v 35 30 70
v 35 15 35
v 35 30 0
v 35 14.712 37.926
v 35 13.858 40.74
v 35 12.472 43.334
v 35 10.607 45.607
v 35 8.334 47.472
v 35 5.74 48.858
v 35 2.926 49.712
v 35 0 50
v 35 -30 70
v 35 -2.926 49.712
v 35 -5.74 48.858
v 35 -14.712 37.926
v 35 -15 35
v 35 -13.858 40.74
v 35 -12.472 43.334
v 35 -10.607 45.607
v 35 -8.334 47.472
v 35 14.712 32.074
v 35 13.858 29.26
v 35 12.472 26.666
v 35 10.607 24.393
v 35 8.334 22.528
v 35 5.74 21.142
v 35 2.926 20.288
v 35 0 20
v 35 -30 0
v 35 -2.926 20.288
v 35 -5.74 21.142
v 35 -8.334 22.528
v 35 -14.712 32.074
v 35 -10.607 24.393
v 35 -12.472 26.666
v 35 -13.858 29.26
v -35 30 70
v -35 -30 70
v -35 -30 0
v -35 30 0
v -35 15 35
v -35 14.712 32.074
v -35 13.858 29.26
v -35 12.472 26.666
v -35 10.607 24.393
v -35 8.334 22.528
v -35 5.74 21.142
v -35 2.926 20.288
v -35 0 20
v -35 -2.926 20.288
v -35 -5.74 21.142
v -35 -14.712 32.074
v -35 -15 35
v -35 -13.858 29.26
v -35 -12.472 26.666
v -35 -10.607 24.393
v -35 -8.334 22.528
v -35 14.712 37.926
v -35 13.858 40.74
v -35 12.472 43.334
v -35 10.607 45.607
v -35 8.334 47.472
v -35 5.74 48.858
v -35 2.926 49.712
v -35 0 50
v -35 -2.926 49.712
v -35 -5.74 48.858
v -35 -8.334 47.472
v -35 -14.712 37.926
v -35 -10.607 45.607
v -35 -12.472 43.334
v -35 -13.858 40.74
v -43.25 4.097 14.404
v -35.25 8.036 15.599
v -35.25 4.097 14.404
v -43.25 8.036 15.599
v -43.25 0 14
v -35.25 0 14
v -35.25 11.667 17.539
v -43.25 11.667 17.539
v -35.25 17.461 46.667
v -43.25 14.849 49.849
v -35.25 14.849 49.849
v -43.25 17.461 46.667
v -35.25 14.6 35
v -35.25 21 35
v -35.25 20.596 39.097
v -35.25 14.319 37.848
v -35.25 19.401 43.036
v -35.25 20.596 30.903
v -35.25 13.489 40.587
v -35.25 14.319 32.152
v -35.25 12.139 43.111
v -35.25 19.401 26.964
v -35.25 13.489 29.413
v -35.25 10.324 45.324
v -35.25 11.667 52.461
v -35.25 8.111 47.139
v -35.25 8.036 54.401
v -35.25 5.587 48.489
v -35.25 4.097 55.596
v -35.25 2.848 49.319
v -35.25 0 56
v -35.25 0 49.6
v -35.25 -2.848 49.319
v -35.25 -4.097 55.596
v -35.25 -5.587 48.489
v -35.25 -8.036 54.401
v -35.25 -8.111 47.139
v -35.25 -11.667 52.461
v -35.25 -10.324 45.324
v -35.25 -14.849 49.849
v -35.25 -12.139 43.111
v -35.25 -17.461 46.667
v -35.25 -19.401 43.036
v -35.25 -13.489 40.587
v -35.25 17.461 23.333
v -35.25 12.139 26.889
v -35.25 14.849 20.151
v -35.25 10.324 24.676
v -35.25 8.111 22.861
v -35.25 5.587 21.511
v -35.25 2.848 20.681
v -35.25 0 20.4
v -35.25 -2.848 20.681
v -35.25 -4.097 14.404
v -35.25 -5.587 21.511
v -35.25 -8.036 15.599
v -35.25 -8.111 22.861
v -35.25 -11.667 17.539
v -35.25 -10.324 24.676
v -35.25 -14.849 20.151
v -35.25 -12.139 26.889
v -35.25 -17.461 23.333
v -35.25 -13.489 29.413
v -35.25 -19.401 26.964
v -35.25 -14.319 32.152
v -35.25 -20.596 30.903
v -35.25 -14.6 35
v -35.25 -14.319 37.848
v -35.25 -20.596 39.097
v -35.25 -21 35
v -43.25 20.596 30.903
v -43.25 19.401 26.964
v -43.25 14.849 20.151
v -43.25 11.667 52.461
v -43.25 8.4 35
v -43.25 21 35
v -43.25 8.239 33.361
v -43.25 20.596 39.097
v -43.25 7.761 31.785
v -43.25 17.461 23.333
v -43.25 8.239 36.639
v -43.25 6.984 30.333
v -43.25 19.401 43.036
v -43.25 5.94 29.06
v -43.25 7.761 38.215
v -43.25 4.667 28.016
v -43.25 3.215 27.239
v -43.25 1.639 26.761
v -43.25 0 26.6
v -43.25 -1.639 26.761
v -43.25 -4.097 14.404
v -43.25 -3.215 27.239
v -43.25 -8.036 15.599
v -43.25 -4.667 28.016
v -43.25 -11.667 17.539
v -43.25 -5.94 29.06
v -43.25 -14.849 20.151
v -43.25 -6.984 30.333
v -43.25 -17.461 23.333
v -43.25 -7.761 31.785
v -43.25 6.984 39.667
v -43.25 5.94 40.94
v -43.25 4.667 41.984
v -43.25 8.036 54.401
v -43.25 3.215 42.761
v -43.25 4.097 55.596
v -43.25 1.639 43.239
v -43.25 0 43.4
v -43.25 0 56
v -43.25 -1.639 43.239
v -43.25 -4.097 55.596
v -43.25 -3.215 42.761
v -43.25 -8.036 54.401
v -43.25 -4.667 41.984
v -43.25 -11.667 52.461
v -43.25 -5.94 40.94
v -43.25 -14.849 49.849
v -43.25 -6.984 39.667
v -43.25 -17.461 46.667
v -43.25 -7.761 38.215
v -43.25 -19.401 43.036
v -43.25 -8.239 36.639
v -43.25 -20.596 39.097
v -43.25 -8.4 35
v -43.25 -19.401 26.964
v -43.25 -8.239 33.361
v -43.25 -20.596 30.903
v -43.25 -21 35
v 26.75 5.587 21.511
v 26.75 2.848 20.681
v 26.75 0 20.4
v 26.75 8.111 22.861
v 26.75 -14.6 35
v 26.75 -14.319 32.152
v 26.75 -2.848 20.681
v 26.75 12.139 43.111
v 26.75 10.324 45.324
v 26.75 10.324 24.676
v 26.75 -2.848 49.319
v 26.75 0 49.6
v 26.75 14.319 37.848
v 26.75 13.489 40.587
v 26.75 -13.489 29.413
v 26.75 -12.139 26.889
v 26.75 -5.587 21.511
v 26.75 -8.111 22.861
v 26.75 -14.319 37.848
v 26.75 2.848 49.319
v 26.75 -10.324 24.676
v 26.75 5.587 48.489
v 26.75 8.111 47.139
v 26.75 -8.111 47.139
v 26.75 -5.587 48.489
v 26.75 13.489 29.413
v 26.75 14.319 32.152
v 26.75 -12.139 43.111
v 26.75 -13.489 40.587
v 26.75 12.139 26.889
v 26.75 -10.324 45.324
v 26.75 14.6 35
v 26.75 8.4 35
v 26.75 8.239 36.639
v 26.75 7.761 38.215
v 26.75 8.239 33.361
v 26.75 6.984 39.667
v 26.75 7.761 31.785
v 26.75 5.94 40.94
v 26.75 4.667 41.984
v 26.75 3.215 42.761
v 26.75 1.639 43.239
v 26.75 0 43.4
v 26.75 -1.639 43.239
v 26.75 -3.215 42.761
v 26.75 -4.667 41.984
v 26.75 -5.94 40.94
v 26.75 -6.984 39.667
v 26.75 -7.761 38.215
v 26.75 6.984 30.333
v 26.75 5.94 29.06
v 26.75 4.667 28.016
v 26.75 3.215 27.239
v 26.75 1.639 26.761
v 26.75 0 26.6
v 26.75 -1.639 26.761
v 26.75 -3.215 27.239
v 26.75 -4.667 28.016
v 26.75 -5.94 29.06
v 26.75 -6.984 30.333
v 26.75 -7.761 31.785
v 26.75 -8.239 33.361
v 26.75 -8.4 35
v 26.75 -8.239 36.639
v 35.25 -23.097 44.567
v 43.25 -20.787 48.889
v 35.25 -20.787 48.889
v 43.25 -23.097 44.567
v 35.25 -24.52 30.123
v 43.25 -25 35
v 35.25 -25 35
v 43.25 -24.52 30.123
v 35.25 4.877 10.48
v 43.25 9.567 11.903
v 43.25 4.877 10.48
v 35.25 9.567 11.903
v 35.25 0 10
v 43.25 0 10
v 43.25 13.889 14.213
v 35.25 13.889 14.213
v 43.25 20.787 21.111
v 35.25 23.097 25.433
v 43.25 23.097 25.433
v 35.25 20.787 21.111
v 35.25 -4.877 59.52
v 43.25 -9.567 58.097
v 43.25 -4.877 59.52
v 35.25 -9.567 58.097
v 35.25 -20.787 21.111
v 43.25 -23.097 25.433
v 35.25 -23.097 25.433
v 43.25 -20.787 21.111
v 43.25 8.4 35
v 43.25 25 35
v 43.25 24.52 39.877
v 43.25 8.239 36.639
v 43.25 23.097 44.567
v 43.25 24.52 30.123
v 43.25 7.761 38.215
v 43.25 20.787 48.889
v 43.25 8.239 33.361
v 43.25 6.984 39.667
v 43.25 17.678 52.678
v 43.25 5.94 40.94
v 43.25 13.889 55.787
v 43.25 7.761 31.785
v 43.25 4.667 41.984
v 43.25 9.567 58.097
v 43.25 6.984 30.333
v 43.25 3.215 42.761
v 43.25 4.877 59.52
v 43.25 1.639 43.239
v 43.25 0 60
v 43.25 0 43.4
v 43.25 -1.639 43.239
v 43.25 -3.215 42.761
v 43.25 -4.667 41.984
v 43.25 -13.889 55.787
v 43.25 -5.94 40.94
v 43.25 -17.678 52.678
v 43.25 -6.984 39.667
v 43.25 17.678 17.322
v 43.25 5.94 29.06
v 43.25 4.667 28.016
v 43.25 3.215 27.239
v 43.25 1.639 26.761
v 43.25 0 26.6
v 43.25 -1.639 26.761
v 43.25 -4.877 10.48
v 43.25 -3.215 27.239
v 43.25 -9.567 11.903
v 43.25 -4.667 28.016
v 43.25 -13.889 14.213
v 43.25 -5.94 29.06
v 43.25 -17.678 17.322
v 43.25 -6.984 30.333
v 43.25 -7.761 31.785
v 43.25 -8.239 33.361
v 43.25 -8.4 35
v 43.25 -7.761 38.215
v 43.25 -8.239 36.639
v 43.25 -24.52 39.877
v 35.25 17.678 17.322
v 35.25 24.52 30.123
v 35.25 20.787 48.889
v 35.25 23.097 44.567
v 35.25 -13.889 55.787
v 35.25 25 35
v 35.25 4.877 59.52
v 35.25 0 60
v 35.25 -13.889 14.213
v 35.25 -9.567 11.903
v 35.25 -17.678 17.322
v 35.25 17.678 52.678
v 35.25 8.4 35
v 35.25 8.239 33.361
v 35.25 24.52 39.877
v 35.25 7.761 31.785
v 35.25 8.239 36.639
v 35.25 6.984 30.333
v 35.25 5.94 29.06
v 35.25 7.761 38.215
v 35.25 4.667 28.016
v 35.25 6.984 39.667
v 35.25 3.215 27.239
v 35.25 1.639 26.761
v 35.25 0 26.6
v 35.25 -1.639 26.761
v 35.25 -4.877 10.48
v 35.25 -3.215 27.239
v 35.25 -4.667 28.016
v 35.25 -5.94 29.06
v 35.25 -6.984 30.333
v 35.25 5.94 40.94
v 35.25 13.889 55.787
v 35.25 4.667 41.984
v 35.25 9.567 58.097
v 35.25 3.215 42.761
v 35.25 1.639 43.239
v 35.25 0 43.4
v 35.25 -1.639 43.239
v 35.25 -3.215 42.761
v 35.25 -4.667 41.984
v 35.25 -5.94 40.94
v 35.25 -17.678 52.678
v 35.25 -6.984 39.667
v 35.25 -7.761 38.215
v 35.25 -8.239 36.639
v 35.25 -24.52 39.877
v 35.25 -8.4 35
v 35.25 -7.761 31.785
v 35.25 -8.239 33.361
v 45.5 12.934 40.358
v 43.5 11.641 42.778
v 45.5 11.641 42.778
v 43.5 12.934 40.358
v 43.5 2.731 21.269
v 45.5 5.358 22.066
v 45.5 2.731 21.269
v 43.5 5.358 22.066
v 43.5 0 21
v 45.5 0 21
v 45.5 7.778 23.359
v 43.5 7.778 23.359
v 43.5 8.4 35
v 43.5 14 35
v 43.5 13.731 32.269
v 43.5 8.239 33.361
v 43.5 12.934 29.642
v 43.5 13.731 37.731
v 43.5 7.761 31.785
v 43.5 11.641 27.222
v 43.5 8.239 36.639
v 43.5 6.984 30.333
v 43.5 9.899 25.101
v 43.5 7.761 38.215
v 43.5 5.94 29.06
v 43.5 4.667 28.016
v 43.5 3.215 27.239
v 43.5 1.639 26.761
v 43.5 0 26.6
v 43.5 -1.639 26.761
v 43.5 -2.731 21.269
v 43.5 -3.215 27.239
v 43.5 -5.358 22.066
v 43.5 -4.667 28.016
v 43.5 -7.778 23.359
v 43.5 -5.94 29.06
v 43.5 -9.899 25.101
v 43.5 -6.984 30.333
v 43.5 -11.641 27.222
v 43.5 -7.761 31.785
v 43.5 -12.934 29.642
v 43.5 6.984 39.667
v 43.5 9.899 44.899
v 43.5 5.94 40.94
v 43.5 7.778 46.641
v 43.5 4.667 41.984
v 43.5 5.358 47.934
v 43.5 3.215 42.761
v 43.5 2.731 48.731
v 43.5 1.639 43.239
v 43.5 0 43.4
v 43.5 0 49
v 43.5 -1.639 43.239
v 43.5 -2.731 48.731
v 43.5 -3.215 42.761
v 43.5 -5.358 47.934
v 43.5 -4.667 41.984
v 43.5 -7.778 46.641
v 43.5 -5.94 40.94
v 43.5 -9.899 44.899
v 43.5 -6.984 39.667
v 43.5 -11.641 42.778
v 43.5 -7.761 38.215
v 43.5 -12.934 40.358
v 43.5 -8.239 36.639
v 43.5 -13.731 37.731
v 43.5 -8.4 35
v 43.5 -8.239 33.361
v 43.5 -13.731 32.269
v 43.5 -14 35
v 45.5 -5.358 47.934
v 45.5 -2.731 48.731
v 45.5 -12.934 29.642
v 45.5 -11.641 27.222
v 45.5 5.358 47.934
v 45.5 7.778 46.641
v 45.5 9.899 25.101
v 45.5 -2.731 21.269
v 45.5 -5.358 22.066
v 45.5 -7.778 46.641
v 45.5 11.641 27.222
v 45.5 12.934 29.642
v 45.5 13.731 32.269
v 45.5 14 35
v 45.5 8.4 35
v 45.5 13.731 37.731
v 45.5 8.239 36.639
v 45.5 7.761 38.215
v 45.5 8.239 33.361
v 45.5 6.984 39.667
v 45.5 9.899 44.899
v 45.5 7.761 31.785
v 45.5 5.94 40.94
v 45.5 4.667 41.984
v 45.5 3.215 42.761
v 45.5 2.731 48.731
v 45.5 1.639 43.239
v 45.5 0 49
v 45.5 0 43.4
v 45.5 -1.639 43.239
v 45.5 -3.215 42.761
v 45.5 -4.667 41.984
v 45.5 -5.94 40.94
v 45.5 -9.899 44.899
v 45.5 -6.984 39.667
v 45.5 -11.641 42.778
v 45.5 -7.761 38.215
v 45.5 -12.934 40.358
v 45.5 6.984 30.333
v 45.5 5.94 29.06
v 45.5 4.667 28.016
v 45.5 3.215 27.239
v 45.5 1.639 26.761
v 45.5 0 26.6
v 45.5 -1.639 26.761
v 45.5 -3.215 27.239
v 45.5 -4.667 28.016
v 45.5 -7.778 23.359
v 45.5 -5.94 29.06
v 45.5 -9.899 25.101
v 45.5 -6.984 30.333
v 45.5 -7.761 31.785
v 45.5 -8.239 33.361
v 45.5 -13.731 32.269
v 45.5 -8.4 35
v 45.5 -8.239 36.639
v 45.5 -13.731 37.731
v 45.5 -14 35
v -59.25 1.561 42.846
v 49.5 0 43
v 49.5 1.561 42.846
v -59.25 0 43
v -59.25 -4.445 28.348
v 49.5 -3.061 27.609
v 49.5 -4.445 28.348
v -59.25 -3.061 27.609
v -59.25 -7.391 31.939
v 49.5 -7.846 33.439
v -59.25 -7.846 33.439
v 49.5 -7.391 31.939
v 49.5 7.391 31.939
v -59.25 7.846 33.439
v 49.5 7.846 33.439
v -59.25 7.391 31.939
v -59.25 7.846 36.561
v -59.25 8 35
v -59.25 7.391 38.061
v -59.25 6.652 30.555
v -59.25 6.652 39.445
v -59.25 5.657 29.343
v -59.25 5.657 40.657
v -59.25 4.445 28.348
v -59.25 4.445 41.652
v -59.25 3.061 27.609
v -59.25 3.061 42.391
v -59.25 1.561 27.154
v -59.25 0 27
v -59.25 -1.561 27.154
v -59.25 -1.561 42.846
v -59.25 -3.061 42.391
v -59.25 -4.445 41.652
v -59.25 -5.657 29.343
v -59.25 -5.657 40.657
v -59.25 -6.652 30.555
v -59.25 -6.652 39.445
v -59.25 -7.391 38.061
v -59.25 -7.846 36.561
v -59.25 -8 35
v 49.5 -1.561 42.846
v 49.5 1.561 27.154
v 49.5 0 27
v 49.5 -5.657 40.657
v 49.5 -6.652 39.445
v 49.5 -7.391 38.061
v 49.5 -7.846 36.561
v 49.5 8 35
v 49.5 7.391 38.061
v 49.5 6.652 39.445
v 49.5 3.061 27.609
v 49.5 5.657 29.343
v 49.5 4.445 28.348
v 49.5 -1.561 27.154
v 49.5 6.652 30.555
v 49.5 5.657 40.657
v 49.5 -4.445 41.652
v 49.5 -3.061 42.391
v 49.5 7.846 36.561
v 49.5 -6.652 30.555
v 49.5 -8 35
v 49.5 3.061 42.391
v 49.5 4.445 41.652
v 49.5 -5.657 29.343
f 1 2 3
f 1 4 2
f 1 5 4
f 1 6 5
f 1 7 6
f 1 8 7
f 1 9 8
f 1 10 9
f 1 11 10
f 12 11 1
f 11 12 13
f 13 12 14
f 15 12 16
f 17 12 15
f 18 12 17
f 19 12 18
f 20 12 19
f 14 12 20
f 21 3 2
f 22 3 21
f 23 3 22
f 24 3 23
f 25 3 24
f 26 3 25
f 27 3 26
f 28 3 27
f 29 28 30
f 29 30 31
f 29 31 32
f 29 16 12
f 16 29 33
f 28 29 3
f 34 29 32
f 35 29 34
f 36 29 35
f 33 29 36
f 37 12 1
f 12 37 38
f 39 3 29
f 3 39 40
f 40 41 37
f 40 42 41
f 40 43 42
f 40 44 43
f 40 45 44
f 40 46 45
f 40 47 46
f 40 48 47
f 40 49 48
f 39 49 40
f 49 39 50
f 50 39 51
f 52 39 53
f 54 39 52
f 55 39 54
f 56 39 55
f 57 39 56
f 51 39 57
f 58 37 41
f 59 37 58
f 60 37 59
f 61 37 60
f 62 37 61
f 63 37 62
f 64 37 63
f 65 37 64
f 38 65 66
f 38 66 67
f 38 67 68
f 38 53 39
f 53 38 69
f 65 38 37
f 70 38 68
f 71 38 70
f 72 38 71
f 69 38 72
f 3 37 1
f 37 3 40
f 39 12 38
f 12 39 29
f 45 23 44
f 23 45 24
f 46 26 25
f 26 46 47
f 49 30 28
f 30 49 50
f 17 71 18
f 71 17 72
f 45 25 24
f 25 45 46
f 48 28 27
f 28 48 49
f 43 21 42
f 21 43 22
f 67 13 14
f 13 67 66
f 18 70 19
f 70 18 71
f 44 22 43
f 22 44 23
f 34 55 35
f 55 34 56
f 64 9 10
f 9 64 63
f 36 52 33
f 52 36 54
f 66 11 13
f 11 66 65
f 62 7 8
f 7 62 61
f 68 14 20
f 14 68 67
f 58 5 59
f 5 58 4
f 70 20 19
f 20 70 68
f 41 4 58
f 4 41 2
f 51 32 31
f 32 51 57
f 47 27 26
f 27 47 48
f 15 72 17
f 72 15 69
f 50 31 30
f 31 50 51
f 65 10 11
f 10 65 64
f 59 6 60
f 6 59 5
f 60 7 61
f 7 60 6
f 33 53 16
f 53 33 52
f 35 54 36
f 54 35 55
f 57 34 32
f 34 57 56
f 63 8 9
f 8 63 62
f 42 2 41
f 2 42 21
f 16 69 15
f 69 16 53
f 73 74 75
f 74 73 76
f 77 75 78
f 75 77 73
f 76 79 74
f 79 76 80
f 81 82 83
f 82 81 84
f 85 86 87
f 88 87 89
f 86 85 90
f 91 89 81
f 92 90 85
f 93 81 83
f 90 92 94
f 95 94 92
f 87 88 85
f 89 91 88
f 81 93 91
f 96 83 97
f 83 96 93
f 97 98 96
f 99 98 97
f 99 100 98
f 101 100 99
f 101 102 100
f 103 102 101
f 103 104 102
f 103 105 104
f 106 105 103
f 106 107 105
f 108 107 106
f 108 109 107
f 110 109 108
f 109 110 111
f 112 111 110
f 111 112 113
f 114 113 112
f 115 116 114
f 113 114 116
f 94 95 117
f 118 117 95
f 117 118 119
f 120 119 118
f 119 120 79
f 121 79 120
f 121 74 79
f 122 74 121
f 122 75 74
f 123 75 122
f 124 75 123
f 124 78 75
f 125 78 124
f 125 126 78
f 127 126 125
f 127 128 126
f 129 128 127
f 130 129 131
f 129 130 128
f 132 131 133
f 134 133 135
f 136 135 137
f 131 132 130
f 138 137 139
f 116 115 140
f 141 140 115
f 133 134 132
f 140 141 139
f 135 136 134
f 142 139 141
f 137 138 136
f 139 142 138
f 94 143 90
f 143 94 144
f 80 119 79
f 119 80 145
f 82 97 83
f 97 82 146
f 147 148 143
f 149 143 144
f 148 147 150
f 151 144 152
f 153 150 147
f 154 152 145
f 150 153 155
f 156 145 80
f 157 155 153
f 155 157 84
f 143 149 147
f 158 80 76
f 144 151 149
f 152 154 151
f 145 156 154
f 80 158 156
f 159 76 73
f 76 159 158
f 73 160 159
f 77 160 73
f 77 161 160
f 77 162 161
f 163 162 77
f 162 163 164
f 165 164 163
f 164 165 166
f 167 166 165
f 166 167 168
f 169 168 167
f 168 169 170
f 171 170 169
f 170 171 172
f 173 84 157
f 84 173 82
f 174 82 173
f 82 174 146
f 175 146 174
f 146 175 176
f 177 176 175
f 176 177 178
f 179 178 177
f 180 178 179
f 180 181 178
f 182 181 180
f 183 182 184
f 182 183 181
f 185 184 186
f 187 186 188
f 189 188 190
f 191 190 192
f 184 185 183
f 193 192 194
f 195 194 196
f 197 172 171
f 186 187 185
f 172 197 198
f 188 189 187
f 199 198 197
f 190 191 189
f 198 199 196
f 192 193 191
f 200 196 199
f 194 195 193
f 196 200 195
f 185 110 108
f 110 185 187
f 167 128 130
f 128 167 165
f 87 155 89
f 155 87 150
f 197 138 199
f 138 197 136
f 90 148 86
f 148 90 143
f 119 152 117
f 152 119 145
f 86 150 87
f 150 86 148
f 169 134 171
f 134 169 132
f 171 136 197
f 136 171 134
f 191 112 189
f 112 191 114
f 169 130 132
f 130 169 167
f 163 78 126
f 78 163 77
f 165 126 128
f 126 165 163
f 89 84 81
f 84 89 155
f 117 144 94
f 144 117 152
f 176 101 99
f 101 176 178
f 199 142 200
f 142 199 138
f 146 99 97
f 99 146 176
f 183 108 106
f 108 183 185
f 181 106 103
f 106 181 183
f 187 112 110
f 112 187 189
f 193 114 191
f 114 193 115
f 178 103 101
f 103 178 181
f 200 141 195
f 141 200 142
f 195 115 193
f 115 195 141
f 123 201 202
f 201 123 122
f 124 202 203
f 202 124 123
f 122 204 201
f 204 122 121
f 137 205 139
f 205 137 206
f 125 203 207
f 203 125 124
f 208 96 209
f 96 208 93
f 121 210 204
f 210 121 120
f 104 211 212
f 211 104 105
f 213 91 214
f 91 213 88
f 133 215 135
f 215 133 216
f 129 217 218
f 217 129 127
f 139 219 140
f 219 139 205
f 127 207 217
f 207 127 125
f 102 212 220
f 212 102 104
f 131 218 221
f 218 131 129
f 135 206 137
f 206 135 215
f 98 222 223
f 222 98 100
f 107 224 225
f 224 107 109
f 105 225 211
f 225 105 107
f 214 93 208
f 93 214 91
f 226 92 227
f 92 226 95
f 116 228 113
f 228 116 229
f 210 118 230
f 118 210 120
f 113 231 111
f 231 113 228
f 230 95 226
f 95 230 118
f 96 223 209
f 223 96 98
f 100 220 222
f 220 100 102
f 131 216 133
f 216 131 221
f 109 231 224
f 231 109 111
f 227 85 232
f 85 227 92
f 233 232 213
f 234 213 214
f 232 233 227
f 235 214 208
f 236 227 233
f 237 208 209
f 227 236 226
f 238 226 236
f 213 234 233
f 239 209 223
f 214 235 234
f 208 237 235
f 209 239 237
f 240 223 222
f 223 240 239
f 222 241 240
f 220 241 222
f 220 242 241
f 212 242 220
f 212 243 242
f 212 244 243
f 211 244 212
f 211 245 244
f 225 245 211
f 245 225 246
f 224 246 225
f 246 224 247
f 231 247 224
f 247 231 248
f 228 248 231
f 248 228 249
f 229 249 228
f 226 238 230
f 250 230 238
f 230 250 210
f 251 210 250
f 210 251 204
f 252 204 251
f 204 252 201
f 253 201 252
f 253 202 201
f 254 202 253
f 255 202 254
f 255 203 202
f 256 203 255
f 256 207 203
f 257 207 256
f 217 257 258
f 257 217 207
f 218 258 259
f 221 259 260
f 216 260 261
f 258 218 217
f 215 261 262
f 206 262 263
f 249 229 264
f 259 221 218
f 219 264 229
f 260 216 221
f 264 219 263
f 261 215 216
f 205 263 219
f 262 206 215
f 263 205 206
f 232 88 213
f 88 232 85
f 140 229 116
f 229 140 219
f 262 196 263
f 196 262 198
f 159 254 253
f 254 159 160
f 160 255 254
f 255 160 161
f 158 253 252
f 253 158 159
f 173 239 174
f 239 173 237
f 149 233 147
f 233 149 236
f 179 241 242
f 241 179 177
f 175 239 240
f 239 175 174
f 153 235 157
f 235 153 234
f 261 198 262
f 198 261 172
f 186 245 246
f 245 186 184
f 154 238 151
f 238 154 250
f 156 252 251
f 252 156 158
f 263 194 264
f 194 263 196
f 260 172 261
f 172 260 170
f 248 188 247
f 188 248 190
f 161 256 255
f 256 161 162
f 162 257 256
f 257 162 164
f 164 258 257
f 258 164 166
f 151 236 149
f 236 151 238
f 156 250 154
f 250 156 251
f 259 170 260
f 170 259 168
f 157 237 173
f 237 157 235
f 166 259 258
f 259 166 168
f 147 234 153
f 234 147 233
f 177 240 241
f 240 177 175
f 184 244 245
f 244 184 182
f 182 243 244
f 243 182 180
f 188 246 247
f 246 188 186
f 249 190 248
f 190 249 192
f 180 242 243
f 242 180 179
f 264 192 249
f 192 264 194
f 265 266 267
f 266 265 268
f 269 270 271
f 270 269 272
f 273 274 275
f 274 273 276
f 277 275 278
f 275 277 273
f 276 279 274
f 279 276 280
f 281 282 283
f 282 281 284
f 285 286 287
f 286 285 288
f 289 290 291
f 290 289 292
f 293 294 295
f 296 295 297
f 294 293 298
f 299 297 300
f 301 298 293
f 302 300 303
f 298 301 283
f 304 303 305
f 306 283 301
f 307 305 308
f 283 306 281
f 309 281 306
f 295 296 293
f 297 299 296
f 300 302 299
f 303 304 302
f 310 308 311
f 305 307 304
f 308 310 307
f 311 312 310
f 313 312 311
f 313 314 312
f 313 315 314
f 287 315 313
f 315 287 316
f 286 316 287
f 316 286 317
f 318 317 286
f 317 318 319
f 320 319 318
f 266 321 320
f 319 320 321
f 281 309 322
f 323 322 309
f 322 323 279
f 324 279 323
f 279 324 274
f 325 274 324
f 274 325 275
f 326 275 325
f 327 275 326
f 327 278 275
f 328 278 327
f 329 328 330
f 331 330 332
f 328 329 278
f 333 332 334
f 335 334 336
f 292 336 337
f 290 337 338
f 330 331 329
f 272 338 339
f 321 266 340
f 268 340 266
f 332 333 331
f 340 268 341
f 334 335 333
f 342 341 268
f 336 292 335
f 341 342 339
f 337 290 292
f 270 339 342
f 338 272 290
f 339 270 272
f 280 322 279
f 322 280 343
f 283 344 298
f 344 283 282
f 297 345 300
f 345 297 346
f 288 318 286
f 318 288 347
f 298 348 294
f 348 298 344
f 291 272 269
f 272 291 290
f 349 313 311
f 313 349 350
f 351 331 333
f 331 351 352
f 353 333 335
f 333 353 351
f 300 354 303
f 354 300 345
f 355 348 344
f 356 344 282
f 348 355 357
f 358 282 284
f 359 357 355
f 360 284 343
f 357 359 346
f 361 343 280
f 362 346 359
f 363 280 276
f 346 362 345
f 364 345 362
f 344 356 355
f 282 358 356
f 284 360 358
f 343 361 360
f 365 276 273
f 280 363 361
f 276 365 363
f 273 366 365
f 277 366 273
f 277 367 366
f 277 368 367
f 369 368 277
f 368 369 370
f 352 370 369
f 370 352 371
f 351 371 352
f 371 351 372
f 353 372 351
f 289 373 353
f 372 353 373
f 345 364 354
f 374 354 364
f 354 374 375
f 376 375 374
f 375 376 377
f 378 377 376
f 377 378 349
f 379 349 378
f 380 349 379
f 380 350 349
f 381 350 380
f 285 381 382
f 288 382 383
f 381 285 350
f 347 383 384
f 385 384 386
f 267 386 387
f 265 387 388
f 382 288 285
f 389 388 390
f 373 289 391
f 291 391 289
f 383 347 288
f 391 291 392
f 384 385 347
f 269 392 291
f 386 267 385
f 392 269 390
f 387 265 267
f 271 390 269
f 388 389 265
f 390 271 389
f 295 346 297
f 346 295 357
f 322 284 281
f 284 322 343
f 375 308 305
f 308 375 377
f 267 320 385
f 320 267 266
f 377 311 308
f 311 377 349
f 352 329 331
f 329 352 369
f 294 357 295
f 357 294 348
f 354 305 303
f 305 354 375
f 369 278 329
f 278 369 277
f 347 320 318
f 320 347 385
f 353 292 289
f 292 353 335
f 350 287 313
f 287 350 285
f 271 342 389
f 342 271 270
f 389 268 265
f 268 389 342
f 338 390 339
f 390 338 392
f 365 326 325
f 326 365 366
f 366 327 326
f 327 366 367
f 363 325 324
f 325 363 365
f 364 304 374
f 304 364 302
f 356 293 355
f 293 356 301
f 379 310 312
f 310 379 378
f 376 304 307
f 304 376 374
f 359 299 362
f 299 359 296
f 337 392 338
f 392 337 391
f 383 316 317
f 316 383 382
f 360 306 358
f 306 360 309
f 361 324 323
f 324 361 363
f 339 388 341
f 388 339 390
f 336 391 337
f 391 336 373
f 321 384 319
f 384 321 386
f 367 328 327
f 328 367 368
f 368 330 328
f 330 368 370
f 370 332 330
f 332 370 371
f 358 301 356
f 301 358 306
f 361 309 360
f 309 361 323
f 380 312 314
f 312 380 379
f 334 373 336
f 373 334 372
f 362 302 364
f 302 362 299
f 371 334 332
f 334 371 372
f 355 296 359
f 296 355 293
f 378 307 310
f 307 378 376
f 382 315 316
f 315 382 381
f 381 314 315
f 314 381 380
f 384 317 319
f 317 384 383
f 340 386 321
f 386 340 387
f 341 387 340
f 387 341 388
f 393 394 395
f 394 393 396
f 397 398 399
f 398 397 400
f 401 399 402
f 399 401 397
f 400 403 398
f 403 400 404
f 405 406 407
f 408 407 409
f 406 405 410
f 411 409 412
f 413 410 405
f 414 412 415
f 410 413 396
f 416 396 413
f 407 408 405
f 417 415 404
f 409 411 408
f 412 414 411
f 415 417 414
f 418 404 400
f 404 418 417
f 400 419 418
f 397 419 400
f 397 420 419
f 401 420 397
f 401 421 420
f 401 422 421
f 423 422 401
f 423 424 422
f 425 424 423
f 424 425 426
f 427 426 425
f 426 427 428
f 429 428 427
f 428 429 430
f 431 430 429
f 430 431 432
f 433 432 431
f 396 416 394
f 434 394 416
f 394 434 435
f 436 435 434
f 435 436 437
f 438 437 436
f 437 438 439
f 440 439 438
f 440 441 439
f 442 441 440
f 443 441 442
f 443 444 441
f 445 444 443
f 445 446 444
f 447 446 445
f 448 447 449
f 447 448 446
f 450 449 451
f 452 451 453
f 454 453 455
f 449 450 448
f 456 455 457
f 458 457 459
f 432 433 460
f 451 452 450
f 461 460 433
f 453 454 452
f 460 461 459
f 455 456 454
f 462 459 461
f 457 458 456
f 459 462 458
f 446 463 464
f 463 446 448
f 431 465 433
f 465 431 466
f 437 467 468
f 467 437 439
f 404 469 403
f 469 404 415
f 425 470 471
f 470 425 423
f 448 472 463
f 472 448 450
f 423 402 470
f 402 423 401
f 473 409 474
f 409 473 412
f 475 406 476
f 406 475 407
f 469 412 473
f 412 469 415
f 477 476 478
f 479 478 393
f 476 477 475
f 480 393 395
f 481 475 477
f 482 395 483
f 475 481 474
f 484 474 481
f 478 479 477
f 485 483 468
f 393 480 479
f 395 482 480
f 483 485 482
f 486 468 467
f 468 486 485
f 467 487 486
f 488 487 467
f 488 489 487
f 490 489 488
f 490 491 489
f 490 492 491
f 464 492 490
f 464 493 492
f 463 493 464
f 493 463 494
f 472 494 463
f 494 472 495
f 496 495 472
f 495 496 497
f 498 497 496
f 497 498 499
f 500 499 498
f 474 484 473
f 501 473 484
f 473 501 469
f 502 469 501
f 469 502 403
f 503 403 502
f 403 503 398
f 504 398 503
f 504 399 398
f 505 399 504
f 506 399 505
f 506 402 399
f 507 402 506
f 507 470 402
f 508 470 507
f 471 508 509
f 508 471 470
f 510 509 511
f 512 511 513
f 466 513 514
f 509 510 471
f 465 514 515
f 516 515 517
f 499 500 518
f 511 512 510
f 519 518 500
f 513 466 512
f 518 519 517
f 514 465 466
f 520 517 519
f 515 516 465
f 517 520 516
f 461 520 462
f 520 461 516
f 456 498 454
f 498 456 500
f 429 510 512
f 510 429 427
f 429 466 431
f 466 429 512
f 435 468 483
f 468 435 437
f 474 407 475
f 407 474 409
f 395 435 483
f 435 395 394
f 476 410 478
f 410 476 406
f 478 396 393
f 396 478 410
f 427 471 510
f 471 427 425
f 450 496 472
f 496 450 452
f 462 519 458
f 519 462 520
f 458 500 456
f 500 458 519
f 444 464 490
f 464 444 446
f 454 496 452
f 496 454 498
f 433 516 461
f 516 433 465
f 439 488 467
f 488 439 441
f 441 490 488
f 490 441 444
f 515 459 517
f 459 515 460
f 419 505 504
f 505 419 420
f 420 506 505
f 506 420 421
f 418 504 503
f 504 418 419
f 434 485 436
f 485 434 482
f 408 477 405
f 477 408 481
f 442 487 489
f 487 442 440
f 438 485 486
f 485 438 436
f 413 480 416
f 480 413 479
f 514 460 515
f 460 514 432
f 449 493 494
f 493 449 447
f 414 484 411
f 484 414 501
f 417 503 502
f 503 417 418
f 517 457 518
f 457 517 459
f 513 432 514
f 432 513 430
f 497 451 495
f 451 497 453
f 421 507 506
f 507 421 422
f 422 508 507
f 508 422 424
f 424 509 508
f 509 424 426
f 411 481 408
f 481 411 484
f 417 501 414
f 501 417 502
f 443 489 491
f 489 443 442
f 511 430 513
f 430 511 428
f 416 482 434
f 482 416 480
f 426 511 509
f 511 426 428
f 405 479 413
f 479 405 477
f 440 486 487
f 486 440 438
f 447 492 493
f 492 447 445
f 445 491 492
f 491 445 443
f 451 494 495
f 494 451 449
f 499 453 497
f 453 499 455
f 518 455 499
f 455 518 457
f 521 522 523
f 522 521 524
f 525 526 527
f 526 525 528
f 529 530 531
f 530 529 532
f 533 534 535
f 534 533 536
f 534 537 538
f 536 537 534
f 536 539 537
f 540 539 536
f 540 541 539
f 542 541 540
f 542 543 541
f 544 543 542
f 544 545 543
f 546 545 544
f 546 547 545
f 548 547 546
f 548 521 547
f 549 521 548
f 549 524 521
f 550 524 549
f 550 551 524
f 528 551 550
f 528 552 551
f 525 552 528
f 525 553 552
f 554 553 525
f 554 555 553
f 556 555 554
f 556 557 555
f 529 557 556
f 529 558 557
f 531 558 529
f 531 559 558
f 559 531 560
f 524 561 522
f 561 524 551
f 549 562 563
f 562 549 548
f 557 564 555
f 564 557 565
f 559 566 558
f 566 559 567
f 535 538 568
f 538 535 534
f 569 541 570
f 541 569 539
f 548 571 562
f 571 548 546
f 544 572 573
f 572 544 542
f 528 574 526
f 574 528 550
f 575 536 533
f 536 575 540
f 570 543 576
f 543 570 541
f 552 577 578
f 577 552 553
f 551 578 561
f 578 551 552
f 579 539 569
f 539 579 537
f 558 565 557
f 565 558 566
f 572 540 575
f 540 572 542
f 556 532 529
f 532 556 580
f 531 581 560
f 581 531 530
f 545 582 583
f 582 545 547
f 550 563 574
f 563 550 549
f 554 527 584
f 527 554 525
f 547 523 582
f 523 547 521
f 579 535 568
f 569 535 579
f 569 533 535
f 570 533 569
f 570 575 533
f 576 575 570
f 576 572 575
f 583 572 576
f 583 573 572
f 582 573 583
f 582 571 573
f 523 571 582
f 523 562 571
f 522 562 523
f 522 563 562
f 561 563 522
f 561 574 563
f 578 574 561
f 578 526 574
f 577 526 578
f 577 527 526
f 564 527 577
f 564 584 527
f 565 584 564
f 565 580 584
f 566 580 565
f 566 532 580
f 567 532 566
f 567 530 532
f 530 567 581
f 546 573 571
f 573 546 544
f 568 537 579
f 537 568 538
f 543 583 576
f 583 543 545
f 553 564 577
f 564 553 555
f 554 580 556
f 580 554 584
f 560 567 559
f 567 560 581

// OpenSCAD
$fn = 32;

// ------------------------------------------------------------------------
// Bushed housing: 70 x 60 x 70 mm housing, bushing d29.2
// Every part is its own module, assembly() places them once.
// ------------------------------------------------------------------------

// --- part 1 ---
module housing() {
  difference() {
    translate([-35, -30, 0]) cube([70, 60, 70]);
    translate([0, 0, 35]) rotate([0, 90, 0]) cylinder(h = 72, d = 30, center = true);
  }
}

// --- part 2 ---
module bushing() {
  difference() {
    union() {
      cylinder(h = 8, d = 42);
      translate([0, 0, 8]) cylinder(h = 62, d = 29.2);
    }
    translate([0, 0, -1]) cylinder(h = 72, d = 16.8);
  }
}

// --- part 3 ---
module shaft() {
  translate([0, 0, -54.375]) cylinder(h = 108.75, d = 16);
}

// --- part 4 ---
module cover() {
  difference() {
    cylinder(h = 8, d = 50);
    translate([0, 0, -1]) cylinder(h = 10, d = 16.8);
  }
}

// --- part 5 ---
module washer() {
  difference() {
      translate([0, 0, 0]) cylinder(h = 2, d = 28);
      translate([0, 0, -1]) cylinder(h = 4, d = 16.8);
    }
}

// --- assembly ---
module assembly() {
  translate([0, 0, 0]) rotate([0, 0, 0]) housing();
  translate([-43.25, 0, 35]) rotate([0, 90, 0]) bushing();
  translate([-4.875, 0, 35]) rotate([0, 90, 0]) shaft();
  translate([35.25, 0, 35]) rotate([0, 90, 0]) cover();
  translate([43.5, 0, 35]) rotate([0, 90, 0]) washer();
}

assembly();
